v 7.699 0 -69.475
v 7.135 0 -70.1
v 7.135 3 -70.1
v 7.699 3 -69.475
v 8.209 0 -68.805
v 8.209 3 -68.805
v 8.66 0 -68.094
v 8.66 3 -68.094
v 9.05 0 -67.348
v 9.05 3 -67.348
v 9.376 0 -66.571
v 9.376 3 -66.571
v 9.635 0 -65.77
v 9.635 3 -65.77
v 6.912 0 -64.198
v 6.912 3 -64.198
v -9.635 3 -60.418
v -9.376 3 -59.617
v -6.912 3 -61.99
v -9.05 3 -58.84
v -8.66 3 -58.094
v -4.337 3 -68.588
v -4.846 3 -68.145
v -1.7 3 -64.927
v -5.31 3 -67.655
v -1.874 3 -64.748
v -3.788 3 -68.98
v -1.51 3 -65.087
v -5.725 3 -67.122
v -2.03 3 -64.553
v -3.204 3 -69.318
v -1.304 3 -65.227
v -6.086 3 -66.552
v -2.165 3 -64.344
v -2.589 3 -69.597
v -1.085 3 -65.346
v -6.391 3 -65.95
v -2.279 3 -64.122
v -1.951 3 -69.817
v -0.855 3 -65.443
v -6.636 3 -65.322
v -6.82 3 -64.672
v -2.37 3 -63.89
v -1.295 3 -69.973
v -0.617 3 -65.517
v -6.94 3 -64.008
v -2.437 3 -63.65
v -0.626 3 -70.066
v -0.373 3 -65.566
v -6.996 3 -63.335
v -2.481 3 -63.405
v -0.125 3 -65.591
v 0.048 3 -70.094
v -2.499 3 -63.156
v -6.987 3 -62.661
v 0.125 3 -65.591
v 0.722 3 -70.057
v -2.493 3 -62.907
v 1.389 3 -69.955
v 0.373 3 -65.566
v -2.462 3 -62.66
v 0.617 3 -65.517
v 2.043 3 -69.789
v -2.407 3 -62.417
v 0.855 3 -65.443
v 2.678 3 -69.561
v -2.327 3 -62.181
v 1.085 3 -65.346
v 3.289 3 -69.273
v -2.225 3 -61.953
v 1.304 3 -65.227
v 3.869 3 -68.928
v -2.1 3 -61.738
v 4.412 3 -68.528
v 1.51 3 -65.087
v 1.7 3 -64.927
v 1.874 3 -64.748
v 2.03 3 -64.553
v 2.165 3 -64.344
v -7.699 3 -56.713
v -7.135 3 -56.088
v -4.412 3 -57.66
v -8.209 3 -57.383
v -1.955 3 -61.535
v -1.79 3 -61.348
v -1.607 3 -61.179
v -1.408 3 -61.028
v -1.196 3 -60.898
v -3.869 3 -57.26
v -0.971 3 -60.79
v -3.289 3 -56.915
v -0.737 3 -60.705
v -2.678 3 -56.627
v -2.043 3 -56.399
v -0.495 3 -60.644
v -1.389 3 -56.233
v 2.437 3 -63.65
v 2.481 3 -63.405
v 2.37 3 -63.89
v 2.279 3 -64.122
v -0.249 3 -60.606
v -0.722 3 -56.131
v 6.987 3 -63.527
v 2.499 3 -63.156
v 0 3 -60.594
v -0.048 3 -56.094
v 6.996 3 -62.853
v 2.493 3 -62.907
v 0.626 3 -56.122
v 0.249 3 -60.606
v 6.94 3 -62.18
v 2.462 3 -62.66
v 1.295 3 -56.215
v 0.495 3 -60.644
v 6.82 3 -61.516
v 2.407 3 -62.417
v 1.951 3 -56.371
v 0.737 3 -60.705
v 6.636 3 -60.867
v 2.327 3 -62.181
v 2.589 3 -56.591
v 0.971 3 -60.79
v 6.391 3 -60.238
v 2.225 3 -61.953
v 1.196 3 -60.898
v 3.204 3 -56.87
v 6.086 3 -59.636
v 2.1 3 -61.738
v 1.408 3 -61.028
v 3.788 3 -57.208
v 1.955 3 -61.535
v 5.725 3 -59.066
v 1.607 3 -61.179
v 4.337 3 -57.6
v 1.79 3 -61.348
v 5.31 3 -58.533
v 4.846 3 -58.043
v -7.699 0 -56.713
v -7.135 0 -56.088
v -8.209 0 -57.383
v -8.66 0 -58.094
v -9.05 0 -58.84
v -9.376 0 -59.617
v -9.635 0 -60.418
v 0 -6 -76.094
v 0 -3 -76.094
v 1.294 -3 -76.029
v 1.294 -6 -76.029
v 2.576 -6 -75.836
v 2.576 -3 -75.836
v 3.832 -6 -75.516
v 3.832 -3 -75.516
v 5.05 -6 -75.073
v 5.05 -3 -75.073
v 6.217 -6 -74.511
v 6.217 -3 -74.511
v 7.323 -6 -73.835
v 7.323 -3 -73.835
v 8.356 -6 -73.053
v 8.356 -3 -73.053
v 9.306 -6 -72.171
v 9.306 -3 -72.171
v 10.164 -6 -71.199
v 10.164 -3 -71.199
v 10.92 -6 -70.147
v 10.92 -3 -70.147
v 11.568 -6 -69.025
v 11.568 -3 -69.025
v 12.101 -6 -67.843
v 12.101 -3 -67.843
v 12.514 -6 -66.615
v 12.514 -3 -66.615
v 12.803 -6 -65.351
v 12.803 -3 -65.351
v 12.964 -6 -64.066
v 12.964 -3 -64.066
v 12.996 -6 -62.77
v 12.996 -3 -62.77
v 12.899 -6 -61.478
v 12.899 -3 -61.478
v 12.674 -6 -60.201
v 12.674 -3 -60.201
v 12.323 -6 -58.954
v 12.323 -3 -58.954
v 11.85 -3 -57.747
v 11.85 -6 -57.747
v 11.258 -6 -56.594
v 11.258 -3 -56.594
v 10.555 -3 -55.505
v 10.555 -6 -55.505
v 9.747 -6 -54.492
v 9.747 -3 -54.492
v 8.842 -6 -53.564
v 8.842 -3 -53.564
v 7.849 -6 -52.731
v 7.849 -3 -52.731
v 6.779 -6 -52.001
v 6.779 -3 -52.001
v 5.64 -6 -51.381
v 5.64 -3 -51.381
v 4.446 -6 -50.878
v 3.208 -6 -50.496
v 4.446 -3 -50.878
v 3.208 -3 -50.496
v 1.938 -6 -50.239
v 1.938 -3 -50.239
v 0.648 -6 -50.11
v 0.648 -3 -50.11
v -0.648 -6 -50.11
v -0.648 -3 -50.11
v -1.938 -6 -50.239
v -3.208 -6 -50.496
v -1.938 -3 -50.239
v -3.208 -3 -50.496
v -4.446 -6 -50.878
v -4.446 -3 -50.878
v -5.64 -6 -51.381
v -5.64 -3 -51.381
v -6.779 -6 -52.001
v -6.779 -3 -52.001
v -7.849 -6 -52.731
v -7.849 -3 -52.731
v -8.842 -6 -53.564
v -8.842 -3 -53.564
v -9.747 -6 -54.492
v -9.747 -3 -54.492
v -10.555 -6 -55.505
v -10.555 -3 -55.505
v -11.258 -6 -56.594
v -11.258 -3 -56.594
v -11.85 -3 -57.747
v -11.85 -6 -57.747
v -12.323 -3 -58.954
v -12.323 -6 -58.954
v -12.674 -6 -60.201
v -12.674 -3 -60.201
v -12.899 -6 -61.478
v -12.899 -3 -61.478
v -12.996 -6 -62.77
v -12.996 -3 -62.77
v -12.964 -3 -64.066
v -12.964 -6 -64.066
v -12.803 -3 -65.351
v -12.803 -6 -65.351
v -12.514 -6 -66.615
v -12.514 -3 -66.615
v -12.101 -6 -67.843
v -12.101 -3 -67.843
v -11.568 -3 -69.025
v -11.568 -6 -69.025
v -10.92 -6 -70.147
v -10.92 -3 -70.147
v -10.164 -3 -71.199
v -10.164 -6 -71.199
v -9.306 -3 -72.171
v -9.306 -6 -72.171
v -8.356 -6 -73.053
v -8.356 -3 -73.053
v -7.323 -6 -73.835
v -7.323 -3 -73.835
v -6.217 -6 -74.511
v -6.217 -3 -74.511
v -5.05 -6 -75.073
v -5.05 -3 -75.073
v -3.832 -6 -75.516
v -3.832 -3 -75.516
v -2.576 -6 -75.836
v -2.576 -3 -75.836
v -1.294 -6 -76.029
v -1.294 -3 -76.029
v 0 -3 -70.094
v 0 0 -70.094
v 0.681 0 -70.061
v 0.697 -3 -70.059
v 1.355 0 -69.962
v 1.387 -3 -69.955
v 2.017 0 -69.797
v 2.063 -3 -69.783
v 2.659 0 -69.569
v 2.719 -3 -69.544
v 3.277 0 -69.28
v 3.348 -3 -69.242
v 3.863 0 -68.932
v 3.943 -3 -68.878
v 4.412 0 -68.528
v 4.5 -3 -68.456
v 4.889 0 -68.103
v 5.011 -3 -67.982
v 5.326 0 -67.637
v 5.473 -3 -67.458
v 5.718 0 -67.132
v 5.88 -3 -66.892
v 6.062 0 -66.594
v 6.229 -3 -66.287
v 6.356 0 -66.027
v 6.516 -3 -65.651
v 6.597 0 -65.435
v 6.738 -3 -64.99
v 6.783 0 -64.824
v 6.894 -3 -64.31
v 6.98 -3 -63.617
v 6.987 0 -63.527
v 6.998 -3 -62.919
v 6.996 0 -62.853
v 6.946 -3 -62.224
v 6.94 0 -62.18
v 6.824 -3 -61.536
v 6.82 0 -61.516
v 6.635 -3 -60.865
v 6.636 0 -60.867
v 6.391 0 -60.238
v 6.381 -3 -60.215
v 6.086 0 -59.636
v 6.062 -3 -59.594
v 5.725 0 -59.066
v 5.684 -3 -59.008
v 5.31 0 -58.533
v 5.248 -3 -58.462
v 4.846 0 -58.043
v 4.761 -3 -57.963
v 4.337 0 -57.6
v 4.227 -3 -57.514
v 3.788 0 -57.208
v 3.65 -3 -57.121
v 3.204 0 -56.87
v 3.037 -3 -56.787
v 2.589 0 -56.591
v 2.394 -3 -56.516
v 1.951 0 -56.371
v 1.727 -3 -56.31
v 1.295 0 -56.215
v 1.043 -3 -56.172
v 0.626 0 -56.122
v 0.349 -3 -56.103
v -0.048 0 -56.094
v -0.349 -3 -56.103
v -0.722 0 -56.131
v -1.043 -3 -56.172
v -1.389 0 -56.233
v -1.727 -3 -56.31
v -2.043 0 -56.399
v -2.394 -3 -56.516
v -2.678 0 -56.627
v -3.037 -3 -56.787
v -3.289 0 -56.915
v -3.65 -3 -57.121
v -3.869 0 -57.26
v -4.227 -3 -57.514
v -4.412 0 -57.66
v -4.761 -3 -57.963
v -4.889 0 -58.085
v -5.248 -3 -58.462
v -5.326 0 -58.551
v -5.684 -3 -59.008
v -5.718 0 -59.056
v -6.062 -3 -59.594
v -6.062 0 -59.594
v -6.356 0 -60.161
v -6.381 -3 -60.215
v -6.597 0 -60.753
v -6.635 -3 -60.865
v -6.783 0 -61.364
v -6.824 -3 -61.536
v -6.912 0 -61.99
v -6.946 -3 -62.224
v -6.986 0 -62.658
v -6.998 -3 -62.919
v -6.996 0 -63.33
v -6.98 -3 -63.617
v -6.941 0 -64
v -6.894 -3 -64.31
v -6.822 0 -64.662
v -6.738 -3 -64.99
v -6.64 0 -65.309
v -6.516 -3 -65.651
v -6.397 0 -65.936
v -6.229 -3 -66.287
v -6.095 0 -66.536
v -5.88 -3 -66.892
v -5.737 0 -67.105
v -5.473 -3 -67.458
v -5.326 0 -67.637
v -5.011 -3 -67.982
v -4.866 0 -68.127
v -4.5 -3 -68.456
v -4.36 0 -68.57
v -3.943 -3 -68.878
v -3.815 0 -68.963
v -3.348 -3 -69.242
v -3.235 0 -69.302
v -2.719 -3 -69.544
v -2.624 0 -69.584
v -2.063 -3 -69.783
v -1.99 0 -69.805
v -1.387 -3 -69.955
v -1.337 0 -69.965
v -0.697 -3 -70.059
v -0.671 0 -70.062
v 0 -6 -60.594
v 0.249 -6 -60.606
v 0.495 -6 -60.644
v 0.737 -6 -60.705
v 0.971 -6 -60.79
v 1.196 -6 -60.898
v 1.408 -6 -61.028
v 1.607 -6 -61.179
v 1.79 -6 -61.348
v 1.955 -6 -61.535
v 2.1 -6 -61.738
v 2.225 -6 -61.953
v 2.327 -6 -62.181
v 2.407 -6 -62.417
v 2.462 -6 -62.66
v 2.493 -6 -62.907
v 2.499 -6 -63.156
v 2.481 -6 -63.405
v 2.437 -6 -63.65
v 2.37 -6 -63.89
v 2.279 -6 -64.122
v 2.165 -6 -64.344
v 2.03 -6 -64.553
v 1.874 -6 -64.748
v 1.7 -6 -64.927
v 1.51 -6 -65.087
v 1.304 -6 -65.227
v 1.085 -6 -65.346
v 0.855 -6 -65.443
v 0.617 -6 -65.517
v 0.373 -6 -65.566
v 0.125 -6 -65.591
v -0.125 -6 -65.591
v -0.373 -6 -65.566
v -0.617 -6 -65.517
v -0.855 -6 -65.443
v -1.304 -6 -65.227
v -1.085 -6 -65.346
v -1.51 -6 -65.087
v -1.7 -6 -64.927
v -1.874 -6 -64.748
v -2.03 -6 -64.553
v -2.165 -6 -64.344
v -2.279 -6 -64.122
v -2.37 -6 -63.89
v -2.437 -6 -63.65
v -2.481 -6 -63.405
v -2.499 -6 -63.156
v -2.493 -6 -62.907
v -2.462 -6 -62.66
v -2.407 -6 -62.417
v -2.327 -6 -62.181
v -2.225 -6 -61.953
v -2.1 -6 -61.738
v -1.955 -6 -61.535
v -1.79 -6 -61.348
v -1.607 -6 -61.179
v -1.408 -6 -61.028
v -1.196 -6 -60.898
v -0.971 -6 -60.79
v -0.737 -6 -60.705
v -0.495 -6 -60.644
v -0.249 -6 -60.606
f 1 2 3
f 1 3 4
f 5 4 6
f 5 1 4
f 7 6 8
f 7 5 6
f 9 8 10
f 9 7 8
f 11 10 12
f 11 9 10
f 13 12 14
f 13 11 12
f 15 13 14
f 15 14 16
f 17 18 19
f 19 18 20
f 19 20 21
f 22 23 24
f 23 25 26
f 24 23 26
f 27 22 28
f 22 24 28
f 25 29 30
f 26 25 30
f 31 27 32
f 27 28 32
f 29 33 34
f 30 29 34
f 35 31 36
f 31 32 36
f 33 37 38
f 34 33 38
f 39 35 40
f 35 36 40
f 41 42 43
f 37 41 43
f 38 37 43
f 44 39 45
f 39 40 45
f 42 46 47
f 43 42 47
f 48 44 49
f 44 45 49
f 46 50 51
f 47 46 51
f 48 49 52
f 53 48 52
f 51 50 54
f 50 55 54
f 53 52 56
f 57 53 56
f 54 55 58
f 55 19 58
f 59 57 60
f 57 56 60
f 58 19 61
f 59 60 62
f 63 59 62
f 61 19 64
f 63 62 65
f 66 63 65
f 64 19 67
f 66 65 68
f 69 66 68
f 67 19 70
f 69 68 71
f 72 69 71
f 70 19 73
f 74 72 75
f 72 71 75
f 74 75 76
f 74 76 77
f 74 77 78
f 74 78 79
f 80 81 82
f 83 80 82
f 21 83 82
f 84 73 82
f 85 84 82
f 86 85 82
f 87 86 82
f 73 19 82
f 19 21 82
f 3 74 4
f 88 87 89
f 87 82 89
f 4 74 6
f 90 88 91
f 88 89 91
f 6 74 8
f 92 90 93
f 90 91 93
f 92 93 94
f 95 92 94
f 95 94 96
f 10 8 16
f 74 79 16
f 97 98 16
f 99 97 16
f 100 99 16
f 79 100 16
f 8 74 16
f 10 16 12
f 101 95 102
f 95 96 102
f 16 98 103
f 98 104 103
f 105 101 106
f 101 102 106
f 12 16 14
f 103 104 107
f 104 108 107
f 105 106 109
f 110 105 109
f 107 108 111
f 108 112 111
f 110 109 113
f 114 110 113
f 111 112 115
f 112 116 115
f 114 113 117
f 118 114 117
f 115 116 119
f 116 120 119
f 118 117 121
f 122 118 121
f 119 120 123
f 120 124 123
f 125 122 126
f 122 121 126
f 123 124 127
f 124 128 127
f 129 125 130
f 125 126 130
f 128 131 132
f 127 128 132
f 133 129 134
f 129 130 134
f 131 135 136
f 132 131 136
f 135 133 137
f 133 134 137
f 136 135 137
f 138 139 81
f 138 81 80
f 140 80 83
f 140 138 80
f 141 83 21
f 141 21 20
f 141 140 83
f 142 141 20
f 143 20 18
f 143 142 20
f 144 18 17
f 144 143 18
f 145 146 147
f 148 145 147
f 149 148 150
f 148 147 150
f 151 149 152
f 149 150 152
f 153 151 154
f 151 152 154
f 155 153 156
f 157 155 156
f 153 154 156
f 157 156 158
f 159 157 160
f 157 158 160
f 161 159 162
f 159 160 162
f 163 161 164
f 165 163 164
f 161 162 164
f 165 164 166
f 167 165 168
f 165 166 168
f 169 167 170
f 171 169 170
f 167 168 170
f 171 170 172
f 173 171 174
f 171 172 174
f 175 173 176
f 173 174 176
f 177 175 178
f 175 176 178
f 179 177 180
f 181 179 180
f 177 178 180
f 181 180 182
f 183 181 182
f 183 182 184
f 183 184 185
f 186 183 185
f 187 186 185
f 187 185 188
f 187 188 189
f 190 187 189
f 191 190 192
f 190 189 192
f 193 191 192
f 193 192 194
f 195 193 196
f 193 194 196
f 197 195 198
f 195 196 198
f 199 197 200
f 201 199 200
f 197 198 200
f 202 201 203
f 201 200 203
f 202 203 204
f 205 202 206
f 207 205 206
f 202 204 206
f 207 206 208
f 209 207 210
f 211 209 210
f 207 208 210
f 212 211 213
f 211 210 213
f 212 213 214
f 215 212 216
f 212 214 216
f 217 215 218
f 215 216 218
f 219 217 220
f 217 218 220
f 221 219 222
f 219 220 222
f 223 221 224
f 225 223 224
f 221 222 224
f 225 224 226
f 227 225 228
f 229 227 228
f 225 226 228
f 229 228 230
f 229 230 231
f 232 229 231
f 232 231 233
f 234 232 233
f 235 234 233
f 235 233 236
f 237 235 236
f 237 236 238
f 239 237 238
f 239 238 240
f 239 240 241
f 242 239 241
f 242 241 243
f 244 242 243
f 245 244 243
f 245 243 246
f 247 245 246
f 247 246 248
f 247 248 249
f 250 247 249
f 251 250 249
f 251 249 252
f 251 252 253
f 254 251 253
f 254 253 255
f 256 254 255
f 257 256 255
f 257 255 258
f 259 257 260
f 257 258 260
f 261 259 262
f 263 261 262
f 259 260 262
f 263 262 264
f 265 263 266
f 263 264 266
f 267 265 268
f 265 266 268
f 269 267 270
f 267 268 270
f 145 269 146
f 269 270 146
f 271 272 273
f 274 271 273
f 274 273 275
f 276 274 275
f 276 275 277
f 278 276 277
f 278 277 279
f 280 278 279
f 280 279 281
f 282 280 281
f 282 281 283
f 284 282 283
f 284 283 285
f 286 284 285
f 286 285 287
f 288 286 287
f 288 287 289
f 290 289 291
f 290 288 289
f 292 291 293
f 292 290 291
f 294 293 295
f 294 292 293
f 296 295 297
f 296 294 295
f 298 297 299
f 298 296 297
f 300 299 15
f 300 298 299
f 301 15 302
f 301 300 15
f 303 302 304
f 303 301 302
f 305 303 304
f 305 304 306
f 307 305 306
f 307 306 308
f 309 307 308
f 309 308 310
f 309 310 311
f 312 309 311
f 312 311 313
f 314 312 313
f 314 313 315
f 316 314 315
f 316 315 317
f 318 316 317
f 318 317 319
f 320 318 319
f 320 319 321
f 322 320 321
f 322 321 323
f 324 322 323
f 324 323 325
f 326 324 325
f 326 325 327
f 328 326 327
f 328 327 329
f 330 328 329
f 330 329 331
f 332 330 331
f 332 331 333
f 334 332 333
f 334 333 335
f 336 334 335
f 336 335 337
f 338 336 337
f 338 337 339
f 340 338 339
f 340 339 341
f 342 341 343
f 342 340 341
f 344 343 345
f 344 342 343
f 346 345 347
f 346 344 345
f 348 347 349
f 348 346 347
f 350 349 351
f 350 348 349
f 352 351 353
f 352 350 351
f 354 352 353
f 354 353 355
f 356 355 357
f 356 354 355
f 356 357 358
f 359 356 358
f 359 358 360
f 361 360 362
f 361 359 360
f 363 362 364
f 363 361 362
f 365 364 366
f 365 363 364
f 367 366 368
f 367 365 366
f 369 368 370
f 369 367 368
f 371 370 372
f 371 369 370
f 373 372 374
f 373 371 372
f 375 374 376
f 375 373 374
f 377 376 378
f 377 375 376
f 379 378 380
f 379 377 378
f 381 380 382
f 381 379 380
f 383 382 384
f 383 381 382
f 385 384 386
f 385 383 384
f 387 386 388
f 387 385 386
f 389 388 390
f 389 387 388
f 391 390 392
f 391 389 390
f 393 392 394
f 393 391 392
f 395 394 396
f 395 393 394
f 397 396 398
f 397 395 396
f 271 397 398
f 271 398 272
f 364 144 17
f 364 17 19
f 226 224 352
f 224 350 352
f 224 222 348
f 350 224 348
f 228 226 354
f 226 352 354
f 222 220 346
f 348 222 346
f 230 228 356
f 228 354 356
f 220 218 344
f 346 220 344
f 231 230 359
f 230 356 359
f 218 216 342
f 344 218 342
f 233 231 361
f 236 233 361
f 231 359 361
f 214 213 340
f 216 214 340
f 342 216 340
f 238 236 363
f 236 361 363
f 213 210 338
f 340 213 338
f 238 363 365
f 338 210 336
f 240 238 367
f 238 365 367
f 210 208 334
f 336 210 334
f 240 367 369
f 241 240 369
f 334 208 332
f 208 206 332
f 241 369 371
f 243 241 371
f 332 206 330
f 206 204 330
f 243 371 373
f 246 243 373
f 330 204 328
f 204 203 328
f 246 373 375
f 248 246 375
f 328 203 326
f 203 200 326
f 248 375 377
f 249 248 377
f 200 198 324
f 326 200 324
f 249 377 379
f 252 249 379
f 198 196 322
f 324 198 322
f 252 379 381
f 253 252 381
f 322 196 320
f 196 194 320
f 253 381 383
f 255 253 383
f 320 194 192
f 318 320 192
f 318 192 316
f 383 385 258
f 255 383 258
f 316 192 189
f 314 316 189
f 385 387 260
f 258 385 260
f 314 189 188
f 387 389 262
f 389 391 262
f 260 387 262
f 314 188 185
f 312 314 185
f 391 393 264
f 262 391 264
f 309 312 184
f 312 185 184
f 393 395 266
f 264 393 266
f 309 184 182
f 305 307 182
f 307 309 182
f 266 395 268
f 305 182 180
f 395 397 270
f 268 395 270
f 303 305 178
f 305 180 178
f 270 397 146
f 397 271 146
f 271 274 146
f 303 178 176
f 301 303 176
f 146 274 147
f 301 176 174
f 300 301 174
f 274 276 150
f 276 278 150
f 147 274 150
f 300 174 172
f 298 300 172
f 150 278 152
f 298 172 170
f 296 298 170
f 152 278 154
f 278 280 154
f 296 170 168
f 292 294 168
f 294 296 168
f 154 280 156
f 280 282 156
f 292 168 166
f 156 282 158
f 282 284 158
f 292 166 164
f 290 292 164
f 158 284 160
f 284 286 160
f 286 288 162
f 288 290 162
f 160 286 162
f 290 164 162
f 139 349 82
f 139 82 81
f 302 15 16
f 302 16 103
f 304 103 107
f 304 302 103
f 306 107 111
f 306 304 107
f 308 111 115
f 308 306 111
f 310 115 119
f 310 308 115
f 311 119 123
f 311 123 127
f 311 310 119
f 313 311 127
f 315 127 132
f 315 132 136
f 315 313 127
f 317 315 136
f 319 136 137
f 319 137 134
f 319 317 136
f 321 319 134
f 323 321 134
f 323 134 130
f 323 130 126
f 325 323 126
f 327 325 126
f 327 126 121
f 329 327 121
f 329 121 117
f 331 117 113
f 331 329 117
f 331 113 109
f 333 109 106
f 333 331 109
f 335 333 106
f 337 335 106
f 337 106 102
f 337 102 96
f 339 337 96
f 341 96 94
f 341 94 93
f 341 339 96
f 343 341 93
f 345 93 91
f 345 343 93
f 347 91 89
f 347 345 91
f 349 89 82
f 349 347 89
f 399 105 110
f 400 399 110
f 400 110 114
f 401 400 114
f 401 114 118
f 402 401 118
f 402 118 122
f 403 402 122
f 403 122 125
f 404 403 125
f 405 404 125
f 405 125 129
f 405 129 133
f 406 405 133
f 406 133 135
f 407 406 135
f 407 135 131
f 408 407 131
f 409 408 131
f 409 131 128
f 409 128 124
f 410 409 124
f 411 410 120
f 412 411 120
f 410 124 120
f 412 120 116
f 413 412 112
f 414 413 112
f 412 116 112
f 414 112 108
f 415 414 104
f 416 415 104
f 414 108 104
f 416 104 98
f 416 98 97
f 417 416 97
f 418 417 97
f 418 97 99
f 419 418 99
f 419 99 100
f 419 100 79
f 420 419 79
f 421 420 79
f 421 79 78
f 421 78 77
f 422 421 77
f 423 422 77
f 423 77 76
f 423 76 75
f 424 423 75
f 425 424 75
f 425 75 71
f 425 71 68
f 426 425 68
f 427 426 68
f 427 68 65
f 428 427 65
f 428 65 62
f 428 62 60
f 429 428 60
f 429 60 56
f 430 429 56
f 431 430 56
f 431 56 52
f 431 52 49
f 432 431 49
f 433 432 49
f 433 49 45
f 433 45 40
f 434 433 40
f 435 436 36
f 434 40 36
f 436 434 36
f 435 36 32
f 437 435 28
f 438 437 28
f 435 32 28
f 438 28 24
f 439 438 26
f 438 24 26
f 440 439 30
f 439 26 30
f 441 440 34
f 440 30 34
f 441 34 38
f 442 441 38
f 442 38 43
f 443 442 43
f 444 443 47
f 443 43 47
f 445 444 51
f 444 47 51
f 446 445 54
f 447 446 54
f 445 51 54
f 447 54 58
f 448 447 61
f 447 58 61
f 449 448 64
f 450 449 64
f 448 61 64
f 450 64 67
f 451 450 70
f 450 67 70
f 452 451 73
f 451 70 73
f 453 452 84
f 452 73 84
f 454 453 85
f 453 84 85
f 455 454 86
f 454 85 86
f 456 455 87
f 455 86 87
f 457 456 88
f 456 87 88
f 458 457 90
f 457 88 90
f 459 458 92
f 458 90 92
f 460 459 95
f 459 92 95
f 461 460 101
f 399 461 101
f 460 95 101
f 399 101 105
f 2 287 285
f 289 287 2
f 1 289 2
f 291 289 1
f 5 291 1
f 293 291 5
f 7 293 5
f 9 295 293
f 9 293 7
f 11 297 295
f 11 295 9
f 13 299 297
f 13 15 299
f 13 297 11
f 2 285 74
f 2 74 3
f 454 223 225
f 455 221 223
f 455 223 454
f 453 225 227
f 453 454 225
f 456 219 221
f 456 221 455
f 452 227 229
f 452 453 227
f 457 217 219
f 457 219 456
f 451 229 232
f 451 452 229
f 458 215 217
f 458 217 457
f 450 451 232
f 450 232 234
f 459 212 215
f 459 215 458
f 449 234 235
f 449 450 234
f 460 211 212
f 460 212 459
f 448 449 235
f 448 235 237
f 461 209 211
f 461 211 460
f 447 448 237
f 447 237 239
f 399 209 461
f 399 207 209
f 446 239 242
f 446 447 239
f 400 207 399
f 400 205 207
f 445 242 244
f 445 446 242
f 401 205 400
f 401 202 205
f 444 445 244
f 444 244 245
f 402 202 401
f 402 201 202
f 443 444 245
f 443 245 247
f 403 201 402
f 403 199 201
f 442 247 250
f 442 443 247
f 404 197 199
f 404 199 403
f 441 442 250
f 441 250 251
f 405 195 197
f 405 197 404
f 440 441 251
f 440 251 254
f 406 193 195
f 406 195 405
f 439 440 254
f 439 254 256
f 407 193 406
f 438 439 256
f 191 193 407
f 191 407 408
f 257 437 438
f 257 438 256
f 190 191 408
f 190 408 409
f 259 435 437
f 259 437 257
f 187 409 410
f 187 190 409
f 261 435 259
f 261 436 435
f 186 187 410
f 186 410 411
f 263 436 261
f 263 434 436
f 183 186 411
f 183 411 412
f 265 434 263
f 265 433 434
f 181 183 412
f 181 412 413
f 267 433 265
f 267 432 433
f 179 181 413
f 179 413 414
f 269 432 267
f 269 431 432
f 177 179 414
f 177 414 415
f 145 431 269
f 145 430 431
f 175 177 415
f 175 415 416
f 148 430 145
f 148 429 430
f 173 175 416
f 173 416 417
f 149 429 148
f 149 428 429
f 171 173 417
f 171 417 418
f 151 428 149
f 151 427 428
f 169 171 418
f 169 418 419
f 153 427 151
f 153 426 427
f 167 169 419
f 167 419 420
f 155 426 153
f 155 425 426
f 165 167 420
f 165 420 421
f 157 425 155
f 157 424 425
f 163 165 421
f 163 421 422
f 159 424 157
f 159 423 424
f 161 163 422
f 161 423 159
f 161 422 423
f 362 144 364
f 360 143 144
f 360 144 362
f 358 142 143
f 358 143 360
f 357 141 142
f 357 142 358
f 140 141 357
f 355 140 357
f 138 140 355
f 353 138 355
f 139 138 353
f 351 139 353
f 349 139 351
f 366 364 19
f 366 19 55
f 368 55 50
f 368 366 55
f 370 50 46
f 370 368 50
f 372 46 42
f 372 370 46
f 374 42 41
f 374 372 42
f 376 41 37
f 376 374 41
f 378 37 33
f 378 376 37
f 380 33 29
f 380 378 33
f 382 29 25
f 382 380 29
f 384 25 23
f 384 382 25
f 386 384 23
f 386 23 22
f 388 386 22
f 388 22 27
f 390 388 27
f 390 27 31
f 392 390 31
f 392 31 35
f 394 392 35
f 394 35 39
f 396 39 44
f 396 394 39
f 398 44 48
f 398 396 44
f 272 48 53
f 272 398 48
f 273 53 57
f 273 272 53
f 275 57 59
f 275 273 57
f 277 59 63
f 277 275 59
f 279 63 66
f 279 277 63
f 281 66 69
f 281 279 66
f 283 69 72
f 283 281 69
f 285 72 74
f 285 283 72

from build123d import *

# Parameters (mm, degrees)
BOSS_EXTRUDE1_DEPTH = 3
BOSS_EXTRUDE2_START = 3
SKETCH2_R           = 7
BOSS_EXTRUDE2_DEPTH = 3
SKETCH3_R           = 13
BOSS_EXTRUDE3_DEPTH = 3
SKETCH4_R           = 2.5
CUT_EXTRUDE1_DEPTH  = 20


with BuildPart() as part:
    # Sketch1 → Boss-Extrude1 (new body)
    with BuildSketch(Plane(origin=(0, 0, 0), x_dir=(-1, 0, 0), z_dir=(0, 1, 0))):
        with BuildLine():
            Line((4.412375826, -57.65977305), (7.135254916, -56.087718075))
            ThreePointArc((7.135254916, -56.087718075), (8.660254038, -58.094010768), (9.635254916, -60.417845094))
            Line((9.635254916, -60.417845094), (6.912375826, -61.989900069))
            ThreePointArc((6.912375826, -61.989900069), (3.5, -69.156188594), (-4.412375826, -68.528248485))
            Line((-4.412375826, -68.528248485), (-7.135254916, -70.10030346))
            ThreePointArc((-7.135254916, -70.10030346), (-8.660254038, -68.094010768), (-9.635254916, -65.770176441))
            Line((-9.635254916, -65.770176441), (-6.912375826, -64.198121466))
            ThreePointArc((-6.912375826, -64.198121466), (-3.5, -57.031832941), (4.412375826, -57.65977305))
        make_face()
    extrude(amount=BOSS_EXTRUDE1_DEPTH)

    # Sketch2 → Boss-Extrude2 (add)
    with BuildSketch(Plane.XZ.offset(BOSS_EXTRUDE2_START)):
        with Locations(Location((0, -63.094010768, 0), (0, 0, 270))):
            Circle(SKETCH2_R)
    extrude(amount=-BOSS_EXTRUDE2_DEPTH)

    # Sketch3 → Boss-Extrude3 (add)
    with BuildSketch(Plane.XZ.offset(3)):
        with Locations(Location((0, -63.094010768, 0), (0, 0, 270))):
            Circle(SKETCH3_R)
    extrude(amount=BOSS_EXTRUDE3_DEPTH)

    # Sketch4 → Cut-Extrude1 (cut)
    with BuildSketch(Plane(origin=(0, 3, 0), x_dir=(1, 0, 0), z_dir=(0, 1, 0))):
        with Locations(Location((0, 63.094010768, 0), (0, 0, 270))):
            Circle(SKETCH4_R)
    extrude(amount=-CUT_EXTRUDE1_DEPTH, mode=Mode.SUBTRACT)


solid = part.part
